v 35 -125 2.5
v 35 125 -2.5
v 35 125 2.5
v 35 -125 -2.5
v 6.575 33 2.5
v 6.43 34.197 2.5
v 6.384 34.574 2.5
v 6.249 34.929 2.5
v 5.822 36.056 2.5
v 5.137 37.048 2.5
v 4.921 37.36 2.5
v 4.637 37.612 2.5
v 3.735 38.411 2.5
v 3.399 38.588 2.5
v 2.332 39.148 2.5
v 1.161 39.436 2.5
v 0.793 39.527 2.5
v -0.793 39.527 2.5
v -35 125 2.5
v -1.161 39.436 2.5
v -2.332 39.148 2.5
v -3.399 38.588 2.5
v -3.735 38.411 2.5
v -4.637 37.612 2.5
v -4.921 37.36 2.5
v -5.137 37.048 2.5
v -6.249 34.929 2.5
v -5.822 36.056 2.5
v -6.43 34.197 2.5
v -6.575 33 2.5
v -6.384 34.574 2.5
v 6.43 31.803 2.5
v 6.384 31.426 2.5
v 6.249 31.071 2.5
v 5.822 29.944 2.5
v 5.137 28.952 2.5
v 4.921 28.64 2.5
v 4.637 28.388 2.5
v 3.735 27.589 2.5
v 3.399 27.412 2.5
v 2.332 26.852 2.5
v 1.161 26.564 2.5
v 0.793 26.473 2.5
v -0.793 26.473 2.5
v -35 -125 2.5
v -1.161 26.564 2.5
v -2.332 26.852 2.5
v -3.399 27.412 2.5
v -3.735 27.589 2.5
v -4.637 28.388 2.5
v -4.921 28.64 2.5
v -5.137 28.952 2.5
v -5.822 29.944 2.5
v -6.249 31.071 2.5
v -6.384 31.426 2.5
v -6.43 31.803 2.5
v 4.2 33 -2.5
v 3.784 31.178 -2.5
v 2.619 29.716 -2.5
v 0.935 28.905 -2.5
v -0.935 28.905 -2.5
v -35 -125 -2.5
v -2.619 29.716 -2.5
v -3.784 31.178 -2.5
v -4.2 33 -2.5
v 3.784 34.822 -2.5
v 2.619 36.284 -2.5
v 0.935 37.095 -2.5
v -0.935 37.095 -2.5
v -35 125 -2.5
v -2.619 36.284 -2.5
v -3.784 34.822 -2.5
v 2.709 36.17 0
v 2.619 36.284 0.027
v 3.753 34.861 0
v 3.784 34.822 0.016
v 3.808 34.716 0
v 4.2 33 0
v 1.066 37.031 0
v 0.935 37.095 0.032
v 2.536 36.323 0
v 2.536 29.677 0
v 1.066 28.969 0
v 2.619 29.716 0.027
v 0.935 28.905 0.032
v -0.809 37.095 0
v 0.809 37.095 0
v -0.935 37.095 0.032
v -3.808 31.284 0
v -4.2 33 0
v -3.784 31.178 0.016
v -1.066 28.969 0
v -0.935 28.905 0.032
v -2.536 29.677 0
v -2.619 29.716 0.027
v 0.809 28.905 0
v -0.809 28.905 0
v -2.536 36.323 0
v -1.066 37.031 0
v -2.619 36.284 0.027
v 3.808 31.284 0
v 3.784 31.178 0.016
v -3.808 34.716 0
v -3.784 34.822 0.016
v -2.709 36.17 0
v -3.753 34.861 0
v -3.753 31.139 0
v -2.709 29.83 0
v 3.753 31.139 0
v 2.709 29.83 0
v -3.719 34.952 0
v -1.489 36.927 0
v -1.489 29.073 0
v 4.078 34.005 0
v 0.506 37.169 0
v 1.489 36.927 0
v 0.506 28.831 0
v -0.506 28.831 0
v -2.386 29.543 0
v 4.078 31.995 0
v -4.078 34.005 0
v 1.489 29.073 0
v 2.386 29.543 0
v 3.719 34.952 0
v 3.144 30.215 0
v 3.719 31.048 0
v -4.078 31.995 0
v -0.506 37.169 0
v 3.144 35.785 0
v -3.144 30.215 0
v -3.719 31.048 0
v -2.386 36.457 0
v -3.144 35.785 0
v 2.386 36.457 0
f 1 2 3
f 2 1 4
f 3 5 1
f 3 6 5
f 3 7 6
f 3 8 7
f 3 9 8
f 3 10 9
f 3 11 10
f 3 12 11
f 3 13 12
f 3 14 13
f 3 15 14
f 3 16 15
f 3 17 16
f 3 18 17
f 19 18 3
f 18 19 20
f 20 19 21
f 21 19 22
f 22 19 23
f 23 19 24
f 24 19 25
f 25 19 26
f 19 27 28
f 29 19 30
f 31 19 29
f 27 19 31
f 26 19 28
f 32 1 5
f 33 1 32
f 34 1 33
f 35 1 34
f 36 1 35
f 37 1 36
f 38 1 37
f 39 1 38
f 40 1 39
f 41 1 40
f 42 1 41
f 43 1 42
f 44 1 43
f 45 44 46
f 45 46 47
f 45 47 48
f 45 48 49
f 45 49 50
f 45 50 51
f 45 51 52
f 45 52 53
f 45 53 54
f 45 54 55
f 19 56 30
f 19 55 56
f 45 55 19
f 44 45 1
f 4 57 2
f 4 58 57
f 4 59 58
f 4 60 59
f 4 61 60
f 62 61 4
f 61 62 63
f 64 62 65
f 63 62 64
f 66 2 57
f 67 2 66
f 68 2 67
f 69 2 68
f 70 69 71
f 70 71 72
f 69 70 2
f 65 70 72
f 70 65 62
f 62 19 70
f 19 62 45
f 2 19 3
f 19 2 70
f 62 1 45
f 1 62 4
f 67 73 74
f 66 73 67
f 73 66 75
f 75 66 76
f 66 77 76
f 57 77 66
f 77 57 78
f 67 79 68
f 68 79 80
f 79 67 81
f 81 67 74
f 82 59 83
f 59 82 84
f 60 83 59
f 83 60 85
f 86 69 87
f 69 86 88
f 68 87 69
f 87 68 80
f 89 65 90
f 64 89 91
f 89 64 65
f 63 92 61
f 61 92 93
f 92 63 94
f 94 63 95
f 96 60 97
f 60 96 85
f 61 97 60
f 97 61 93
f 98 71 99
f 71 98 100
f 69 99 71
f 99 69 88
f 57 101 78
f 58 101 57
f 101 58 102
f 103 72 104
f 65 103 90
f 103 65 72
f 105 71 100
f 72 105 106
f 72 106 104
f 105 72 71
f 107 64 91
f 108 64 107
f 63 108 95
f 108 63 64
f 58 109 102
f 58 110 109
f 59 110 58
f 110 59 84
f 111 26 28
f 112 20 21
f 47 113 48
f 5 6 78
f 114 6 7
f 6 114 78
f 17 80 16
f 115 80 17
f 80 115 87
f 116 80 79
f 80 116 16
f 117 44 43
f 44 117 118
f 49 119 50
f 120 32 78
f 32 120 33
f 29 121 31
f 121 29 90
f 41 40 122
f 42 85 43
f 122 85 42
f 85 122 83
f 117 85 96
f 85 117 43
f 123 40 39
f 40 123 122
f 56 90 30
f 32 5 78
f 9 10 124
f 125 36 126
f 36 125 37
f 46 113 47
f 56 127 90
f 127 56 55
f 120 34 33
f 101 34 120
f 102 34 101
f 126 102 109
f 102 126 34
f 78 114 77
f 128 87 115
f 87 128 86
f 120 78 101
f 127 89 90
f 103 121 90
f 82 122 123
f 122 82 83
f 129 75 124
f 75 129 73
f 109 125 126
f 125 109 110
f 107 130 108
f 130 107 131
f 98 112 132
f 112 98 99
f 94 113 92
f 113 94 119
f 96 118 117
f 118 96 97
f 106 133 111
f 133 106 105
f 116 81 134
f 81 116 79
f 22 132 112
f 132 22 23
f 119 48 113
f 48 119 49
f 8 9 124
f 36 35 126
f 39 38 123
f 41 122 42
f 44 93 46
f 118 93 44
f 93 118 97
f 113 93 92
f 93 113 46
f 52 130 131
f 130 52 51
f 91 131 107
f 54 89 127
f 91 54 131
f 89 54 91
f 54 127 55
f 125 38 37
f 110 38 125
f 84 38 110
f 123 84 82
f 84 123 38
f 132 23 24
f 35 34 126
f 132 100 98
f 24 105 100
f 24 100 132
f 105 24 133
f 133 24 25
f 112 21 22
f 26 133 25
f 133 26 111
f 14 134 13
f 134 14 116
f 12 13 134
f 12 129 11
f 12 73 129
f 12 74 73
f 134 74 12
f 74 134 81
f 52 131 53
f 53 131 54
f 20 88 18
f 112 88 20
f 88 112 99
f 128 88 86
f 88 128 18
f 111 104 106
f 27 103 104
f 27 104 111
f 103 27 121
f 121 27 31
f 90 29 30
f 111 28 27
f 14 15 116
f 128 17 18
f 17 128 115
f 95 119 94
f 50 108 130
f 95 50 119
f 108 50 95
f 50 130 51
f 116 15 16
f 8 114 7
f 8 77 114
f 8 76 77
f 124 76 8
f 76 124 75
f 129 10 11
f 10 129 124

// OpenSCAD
//Bottom
difference(){
    cube([70,250,5],true);

    translate([0,33,-5])
        cylinder(h=10, r1=4.2, r2=4.2);
    
    translate([0,33,0])
        cylinder(h=4, r1=4.2, r2=8);
    }
